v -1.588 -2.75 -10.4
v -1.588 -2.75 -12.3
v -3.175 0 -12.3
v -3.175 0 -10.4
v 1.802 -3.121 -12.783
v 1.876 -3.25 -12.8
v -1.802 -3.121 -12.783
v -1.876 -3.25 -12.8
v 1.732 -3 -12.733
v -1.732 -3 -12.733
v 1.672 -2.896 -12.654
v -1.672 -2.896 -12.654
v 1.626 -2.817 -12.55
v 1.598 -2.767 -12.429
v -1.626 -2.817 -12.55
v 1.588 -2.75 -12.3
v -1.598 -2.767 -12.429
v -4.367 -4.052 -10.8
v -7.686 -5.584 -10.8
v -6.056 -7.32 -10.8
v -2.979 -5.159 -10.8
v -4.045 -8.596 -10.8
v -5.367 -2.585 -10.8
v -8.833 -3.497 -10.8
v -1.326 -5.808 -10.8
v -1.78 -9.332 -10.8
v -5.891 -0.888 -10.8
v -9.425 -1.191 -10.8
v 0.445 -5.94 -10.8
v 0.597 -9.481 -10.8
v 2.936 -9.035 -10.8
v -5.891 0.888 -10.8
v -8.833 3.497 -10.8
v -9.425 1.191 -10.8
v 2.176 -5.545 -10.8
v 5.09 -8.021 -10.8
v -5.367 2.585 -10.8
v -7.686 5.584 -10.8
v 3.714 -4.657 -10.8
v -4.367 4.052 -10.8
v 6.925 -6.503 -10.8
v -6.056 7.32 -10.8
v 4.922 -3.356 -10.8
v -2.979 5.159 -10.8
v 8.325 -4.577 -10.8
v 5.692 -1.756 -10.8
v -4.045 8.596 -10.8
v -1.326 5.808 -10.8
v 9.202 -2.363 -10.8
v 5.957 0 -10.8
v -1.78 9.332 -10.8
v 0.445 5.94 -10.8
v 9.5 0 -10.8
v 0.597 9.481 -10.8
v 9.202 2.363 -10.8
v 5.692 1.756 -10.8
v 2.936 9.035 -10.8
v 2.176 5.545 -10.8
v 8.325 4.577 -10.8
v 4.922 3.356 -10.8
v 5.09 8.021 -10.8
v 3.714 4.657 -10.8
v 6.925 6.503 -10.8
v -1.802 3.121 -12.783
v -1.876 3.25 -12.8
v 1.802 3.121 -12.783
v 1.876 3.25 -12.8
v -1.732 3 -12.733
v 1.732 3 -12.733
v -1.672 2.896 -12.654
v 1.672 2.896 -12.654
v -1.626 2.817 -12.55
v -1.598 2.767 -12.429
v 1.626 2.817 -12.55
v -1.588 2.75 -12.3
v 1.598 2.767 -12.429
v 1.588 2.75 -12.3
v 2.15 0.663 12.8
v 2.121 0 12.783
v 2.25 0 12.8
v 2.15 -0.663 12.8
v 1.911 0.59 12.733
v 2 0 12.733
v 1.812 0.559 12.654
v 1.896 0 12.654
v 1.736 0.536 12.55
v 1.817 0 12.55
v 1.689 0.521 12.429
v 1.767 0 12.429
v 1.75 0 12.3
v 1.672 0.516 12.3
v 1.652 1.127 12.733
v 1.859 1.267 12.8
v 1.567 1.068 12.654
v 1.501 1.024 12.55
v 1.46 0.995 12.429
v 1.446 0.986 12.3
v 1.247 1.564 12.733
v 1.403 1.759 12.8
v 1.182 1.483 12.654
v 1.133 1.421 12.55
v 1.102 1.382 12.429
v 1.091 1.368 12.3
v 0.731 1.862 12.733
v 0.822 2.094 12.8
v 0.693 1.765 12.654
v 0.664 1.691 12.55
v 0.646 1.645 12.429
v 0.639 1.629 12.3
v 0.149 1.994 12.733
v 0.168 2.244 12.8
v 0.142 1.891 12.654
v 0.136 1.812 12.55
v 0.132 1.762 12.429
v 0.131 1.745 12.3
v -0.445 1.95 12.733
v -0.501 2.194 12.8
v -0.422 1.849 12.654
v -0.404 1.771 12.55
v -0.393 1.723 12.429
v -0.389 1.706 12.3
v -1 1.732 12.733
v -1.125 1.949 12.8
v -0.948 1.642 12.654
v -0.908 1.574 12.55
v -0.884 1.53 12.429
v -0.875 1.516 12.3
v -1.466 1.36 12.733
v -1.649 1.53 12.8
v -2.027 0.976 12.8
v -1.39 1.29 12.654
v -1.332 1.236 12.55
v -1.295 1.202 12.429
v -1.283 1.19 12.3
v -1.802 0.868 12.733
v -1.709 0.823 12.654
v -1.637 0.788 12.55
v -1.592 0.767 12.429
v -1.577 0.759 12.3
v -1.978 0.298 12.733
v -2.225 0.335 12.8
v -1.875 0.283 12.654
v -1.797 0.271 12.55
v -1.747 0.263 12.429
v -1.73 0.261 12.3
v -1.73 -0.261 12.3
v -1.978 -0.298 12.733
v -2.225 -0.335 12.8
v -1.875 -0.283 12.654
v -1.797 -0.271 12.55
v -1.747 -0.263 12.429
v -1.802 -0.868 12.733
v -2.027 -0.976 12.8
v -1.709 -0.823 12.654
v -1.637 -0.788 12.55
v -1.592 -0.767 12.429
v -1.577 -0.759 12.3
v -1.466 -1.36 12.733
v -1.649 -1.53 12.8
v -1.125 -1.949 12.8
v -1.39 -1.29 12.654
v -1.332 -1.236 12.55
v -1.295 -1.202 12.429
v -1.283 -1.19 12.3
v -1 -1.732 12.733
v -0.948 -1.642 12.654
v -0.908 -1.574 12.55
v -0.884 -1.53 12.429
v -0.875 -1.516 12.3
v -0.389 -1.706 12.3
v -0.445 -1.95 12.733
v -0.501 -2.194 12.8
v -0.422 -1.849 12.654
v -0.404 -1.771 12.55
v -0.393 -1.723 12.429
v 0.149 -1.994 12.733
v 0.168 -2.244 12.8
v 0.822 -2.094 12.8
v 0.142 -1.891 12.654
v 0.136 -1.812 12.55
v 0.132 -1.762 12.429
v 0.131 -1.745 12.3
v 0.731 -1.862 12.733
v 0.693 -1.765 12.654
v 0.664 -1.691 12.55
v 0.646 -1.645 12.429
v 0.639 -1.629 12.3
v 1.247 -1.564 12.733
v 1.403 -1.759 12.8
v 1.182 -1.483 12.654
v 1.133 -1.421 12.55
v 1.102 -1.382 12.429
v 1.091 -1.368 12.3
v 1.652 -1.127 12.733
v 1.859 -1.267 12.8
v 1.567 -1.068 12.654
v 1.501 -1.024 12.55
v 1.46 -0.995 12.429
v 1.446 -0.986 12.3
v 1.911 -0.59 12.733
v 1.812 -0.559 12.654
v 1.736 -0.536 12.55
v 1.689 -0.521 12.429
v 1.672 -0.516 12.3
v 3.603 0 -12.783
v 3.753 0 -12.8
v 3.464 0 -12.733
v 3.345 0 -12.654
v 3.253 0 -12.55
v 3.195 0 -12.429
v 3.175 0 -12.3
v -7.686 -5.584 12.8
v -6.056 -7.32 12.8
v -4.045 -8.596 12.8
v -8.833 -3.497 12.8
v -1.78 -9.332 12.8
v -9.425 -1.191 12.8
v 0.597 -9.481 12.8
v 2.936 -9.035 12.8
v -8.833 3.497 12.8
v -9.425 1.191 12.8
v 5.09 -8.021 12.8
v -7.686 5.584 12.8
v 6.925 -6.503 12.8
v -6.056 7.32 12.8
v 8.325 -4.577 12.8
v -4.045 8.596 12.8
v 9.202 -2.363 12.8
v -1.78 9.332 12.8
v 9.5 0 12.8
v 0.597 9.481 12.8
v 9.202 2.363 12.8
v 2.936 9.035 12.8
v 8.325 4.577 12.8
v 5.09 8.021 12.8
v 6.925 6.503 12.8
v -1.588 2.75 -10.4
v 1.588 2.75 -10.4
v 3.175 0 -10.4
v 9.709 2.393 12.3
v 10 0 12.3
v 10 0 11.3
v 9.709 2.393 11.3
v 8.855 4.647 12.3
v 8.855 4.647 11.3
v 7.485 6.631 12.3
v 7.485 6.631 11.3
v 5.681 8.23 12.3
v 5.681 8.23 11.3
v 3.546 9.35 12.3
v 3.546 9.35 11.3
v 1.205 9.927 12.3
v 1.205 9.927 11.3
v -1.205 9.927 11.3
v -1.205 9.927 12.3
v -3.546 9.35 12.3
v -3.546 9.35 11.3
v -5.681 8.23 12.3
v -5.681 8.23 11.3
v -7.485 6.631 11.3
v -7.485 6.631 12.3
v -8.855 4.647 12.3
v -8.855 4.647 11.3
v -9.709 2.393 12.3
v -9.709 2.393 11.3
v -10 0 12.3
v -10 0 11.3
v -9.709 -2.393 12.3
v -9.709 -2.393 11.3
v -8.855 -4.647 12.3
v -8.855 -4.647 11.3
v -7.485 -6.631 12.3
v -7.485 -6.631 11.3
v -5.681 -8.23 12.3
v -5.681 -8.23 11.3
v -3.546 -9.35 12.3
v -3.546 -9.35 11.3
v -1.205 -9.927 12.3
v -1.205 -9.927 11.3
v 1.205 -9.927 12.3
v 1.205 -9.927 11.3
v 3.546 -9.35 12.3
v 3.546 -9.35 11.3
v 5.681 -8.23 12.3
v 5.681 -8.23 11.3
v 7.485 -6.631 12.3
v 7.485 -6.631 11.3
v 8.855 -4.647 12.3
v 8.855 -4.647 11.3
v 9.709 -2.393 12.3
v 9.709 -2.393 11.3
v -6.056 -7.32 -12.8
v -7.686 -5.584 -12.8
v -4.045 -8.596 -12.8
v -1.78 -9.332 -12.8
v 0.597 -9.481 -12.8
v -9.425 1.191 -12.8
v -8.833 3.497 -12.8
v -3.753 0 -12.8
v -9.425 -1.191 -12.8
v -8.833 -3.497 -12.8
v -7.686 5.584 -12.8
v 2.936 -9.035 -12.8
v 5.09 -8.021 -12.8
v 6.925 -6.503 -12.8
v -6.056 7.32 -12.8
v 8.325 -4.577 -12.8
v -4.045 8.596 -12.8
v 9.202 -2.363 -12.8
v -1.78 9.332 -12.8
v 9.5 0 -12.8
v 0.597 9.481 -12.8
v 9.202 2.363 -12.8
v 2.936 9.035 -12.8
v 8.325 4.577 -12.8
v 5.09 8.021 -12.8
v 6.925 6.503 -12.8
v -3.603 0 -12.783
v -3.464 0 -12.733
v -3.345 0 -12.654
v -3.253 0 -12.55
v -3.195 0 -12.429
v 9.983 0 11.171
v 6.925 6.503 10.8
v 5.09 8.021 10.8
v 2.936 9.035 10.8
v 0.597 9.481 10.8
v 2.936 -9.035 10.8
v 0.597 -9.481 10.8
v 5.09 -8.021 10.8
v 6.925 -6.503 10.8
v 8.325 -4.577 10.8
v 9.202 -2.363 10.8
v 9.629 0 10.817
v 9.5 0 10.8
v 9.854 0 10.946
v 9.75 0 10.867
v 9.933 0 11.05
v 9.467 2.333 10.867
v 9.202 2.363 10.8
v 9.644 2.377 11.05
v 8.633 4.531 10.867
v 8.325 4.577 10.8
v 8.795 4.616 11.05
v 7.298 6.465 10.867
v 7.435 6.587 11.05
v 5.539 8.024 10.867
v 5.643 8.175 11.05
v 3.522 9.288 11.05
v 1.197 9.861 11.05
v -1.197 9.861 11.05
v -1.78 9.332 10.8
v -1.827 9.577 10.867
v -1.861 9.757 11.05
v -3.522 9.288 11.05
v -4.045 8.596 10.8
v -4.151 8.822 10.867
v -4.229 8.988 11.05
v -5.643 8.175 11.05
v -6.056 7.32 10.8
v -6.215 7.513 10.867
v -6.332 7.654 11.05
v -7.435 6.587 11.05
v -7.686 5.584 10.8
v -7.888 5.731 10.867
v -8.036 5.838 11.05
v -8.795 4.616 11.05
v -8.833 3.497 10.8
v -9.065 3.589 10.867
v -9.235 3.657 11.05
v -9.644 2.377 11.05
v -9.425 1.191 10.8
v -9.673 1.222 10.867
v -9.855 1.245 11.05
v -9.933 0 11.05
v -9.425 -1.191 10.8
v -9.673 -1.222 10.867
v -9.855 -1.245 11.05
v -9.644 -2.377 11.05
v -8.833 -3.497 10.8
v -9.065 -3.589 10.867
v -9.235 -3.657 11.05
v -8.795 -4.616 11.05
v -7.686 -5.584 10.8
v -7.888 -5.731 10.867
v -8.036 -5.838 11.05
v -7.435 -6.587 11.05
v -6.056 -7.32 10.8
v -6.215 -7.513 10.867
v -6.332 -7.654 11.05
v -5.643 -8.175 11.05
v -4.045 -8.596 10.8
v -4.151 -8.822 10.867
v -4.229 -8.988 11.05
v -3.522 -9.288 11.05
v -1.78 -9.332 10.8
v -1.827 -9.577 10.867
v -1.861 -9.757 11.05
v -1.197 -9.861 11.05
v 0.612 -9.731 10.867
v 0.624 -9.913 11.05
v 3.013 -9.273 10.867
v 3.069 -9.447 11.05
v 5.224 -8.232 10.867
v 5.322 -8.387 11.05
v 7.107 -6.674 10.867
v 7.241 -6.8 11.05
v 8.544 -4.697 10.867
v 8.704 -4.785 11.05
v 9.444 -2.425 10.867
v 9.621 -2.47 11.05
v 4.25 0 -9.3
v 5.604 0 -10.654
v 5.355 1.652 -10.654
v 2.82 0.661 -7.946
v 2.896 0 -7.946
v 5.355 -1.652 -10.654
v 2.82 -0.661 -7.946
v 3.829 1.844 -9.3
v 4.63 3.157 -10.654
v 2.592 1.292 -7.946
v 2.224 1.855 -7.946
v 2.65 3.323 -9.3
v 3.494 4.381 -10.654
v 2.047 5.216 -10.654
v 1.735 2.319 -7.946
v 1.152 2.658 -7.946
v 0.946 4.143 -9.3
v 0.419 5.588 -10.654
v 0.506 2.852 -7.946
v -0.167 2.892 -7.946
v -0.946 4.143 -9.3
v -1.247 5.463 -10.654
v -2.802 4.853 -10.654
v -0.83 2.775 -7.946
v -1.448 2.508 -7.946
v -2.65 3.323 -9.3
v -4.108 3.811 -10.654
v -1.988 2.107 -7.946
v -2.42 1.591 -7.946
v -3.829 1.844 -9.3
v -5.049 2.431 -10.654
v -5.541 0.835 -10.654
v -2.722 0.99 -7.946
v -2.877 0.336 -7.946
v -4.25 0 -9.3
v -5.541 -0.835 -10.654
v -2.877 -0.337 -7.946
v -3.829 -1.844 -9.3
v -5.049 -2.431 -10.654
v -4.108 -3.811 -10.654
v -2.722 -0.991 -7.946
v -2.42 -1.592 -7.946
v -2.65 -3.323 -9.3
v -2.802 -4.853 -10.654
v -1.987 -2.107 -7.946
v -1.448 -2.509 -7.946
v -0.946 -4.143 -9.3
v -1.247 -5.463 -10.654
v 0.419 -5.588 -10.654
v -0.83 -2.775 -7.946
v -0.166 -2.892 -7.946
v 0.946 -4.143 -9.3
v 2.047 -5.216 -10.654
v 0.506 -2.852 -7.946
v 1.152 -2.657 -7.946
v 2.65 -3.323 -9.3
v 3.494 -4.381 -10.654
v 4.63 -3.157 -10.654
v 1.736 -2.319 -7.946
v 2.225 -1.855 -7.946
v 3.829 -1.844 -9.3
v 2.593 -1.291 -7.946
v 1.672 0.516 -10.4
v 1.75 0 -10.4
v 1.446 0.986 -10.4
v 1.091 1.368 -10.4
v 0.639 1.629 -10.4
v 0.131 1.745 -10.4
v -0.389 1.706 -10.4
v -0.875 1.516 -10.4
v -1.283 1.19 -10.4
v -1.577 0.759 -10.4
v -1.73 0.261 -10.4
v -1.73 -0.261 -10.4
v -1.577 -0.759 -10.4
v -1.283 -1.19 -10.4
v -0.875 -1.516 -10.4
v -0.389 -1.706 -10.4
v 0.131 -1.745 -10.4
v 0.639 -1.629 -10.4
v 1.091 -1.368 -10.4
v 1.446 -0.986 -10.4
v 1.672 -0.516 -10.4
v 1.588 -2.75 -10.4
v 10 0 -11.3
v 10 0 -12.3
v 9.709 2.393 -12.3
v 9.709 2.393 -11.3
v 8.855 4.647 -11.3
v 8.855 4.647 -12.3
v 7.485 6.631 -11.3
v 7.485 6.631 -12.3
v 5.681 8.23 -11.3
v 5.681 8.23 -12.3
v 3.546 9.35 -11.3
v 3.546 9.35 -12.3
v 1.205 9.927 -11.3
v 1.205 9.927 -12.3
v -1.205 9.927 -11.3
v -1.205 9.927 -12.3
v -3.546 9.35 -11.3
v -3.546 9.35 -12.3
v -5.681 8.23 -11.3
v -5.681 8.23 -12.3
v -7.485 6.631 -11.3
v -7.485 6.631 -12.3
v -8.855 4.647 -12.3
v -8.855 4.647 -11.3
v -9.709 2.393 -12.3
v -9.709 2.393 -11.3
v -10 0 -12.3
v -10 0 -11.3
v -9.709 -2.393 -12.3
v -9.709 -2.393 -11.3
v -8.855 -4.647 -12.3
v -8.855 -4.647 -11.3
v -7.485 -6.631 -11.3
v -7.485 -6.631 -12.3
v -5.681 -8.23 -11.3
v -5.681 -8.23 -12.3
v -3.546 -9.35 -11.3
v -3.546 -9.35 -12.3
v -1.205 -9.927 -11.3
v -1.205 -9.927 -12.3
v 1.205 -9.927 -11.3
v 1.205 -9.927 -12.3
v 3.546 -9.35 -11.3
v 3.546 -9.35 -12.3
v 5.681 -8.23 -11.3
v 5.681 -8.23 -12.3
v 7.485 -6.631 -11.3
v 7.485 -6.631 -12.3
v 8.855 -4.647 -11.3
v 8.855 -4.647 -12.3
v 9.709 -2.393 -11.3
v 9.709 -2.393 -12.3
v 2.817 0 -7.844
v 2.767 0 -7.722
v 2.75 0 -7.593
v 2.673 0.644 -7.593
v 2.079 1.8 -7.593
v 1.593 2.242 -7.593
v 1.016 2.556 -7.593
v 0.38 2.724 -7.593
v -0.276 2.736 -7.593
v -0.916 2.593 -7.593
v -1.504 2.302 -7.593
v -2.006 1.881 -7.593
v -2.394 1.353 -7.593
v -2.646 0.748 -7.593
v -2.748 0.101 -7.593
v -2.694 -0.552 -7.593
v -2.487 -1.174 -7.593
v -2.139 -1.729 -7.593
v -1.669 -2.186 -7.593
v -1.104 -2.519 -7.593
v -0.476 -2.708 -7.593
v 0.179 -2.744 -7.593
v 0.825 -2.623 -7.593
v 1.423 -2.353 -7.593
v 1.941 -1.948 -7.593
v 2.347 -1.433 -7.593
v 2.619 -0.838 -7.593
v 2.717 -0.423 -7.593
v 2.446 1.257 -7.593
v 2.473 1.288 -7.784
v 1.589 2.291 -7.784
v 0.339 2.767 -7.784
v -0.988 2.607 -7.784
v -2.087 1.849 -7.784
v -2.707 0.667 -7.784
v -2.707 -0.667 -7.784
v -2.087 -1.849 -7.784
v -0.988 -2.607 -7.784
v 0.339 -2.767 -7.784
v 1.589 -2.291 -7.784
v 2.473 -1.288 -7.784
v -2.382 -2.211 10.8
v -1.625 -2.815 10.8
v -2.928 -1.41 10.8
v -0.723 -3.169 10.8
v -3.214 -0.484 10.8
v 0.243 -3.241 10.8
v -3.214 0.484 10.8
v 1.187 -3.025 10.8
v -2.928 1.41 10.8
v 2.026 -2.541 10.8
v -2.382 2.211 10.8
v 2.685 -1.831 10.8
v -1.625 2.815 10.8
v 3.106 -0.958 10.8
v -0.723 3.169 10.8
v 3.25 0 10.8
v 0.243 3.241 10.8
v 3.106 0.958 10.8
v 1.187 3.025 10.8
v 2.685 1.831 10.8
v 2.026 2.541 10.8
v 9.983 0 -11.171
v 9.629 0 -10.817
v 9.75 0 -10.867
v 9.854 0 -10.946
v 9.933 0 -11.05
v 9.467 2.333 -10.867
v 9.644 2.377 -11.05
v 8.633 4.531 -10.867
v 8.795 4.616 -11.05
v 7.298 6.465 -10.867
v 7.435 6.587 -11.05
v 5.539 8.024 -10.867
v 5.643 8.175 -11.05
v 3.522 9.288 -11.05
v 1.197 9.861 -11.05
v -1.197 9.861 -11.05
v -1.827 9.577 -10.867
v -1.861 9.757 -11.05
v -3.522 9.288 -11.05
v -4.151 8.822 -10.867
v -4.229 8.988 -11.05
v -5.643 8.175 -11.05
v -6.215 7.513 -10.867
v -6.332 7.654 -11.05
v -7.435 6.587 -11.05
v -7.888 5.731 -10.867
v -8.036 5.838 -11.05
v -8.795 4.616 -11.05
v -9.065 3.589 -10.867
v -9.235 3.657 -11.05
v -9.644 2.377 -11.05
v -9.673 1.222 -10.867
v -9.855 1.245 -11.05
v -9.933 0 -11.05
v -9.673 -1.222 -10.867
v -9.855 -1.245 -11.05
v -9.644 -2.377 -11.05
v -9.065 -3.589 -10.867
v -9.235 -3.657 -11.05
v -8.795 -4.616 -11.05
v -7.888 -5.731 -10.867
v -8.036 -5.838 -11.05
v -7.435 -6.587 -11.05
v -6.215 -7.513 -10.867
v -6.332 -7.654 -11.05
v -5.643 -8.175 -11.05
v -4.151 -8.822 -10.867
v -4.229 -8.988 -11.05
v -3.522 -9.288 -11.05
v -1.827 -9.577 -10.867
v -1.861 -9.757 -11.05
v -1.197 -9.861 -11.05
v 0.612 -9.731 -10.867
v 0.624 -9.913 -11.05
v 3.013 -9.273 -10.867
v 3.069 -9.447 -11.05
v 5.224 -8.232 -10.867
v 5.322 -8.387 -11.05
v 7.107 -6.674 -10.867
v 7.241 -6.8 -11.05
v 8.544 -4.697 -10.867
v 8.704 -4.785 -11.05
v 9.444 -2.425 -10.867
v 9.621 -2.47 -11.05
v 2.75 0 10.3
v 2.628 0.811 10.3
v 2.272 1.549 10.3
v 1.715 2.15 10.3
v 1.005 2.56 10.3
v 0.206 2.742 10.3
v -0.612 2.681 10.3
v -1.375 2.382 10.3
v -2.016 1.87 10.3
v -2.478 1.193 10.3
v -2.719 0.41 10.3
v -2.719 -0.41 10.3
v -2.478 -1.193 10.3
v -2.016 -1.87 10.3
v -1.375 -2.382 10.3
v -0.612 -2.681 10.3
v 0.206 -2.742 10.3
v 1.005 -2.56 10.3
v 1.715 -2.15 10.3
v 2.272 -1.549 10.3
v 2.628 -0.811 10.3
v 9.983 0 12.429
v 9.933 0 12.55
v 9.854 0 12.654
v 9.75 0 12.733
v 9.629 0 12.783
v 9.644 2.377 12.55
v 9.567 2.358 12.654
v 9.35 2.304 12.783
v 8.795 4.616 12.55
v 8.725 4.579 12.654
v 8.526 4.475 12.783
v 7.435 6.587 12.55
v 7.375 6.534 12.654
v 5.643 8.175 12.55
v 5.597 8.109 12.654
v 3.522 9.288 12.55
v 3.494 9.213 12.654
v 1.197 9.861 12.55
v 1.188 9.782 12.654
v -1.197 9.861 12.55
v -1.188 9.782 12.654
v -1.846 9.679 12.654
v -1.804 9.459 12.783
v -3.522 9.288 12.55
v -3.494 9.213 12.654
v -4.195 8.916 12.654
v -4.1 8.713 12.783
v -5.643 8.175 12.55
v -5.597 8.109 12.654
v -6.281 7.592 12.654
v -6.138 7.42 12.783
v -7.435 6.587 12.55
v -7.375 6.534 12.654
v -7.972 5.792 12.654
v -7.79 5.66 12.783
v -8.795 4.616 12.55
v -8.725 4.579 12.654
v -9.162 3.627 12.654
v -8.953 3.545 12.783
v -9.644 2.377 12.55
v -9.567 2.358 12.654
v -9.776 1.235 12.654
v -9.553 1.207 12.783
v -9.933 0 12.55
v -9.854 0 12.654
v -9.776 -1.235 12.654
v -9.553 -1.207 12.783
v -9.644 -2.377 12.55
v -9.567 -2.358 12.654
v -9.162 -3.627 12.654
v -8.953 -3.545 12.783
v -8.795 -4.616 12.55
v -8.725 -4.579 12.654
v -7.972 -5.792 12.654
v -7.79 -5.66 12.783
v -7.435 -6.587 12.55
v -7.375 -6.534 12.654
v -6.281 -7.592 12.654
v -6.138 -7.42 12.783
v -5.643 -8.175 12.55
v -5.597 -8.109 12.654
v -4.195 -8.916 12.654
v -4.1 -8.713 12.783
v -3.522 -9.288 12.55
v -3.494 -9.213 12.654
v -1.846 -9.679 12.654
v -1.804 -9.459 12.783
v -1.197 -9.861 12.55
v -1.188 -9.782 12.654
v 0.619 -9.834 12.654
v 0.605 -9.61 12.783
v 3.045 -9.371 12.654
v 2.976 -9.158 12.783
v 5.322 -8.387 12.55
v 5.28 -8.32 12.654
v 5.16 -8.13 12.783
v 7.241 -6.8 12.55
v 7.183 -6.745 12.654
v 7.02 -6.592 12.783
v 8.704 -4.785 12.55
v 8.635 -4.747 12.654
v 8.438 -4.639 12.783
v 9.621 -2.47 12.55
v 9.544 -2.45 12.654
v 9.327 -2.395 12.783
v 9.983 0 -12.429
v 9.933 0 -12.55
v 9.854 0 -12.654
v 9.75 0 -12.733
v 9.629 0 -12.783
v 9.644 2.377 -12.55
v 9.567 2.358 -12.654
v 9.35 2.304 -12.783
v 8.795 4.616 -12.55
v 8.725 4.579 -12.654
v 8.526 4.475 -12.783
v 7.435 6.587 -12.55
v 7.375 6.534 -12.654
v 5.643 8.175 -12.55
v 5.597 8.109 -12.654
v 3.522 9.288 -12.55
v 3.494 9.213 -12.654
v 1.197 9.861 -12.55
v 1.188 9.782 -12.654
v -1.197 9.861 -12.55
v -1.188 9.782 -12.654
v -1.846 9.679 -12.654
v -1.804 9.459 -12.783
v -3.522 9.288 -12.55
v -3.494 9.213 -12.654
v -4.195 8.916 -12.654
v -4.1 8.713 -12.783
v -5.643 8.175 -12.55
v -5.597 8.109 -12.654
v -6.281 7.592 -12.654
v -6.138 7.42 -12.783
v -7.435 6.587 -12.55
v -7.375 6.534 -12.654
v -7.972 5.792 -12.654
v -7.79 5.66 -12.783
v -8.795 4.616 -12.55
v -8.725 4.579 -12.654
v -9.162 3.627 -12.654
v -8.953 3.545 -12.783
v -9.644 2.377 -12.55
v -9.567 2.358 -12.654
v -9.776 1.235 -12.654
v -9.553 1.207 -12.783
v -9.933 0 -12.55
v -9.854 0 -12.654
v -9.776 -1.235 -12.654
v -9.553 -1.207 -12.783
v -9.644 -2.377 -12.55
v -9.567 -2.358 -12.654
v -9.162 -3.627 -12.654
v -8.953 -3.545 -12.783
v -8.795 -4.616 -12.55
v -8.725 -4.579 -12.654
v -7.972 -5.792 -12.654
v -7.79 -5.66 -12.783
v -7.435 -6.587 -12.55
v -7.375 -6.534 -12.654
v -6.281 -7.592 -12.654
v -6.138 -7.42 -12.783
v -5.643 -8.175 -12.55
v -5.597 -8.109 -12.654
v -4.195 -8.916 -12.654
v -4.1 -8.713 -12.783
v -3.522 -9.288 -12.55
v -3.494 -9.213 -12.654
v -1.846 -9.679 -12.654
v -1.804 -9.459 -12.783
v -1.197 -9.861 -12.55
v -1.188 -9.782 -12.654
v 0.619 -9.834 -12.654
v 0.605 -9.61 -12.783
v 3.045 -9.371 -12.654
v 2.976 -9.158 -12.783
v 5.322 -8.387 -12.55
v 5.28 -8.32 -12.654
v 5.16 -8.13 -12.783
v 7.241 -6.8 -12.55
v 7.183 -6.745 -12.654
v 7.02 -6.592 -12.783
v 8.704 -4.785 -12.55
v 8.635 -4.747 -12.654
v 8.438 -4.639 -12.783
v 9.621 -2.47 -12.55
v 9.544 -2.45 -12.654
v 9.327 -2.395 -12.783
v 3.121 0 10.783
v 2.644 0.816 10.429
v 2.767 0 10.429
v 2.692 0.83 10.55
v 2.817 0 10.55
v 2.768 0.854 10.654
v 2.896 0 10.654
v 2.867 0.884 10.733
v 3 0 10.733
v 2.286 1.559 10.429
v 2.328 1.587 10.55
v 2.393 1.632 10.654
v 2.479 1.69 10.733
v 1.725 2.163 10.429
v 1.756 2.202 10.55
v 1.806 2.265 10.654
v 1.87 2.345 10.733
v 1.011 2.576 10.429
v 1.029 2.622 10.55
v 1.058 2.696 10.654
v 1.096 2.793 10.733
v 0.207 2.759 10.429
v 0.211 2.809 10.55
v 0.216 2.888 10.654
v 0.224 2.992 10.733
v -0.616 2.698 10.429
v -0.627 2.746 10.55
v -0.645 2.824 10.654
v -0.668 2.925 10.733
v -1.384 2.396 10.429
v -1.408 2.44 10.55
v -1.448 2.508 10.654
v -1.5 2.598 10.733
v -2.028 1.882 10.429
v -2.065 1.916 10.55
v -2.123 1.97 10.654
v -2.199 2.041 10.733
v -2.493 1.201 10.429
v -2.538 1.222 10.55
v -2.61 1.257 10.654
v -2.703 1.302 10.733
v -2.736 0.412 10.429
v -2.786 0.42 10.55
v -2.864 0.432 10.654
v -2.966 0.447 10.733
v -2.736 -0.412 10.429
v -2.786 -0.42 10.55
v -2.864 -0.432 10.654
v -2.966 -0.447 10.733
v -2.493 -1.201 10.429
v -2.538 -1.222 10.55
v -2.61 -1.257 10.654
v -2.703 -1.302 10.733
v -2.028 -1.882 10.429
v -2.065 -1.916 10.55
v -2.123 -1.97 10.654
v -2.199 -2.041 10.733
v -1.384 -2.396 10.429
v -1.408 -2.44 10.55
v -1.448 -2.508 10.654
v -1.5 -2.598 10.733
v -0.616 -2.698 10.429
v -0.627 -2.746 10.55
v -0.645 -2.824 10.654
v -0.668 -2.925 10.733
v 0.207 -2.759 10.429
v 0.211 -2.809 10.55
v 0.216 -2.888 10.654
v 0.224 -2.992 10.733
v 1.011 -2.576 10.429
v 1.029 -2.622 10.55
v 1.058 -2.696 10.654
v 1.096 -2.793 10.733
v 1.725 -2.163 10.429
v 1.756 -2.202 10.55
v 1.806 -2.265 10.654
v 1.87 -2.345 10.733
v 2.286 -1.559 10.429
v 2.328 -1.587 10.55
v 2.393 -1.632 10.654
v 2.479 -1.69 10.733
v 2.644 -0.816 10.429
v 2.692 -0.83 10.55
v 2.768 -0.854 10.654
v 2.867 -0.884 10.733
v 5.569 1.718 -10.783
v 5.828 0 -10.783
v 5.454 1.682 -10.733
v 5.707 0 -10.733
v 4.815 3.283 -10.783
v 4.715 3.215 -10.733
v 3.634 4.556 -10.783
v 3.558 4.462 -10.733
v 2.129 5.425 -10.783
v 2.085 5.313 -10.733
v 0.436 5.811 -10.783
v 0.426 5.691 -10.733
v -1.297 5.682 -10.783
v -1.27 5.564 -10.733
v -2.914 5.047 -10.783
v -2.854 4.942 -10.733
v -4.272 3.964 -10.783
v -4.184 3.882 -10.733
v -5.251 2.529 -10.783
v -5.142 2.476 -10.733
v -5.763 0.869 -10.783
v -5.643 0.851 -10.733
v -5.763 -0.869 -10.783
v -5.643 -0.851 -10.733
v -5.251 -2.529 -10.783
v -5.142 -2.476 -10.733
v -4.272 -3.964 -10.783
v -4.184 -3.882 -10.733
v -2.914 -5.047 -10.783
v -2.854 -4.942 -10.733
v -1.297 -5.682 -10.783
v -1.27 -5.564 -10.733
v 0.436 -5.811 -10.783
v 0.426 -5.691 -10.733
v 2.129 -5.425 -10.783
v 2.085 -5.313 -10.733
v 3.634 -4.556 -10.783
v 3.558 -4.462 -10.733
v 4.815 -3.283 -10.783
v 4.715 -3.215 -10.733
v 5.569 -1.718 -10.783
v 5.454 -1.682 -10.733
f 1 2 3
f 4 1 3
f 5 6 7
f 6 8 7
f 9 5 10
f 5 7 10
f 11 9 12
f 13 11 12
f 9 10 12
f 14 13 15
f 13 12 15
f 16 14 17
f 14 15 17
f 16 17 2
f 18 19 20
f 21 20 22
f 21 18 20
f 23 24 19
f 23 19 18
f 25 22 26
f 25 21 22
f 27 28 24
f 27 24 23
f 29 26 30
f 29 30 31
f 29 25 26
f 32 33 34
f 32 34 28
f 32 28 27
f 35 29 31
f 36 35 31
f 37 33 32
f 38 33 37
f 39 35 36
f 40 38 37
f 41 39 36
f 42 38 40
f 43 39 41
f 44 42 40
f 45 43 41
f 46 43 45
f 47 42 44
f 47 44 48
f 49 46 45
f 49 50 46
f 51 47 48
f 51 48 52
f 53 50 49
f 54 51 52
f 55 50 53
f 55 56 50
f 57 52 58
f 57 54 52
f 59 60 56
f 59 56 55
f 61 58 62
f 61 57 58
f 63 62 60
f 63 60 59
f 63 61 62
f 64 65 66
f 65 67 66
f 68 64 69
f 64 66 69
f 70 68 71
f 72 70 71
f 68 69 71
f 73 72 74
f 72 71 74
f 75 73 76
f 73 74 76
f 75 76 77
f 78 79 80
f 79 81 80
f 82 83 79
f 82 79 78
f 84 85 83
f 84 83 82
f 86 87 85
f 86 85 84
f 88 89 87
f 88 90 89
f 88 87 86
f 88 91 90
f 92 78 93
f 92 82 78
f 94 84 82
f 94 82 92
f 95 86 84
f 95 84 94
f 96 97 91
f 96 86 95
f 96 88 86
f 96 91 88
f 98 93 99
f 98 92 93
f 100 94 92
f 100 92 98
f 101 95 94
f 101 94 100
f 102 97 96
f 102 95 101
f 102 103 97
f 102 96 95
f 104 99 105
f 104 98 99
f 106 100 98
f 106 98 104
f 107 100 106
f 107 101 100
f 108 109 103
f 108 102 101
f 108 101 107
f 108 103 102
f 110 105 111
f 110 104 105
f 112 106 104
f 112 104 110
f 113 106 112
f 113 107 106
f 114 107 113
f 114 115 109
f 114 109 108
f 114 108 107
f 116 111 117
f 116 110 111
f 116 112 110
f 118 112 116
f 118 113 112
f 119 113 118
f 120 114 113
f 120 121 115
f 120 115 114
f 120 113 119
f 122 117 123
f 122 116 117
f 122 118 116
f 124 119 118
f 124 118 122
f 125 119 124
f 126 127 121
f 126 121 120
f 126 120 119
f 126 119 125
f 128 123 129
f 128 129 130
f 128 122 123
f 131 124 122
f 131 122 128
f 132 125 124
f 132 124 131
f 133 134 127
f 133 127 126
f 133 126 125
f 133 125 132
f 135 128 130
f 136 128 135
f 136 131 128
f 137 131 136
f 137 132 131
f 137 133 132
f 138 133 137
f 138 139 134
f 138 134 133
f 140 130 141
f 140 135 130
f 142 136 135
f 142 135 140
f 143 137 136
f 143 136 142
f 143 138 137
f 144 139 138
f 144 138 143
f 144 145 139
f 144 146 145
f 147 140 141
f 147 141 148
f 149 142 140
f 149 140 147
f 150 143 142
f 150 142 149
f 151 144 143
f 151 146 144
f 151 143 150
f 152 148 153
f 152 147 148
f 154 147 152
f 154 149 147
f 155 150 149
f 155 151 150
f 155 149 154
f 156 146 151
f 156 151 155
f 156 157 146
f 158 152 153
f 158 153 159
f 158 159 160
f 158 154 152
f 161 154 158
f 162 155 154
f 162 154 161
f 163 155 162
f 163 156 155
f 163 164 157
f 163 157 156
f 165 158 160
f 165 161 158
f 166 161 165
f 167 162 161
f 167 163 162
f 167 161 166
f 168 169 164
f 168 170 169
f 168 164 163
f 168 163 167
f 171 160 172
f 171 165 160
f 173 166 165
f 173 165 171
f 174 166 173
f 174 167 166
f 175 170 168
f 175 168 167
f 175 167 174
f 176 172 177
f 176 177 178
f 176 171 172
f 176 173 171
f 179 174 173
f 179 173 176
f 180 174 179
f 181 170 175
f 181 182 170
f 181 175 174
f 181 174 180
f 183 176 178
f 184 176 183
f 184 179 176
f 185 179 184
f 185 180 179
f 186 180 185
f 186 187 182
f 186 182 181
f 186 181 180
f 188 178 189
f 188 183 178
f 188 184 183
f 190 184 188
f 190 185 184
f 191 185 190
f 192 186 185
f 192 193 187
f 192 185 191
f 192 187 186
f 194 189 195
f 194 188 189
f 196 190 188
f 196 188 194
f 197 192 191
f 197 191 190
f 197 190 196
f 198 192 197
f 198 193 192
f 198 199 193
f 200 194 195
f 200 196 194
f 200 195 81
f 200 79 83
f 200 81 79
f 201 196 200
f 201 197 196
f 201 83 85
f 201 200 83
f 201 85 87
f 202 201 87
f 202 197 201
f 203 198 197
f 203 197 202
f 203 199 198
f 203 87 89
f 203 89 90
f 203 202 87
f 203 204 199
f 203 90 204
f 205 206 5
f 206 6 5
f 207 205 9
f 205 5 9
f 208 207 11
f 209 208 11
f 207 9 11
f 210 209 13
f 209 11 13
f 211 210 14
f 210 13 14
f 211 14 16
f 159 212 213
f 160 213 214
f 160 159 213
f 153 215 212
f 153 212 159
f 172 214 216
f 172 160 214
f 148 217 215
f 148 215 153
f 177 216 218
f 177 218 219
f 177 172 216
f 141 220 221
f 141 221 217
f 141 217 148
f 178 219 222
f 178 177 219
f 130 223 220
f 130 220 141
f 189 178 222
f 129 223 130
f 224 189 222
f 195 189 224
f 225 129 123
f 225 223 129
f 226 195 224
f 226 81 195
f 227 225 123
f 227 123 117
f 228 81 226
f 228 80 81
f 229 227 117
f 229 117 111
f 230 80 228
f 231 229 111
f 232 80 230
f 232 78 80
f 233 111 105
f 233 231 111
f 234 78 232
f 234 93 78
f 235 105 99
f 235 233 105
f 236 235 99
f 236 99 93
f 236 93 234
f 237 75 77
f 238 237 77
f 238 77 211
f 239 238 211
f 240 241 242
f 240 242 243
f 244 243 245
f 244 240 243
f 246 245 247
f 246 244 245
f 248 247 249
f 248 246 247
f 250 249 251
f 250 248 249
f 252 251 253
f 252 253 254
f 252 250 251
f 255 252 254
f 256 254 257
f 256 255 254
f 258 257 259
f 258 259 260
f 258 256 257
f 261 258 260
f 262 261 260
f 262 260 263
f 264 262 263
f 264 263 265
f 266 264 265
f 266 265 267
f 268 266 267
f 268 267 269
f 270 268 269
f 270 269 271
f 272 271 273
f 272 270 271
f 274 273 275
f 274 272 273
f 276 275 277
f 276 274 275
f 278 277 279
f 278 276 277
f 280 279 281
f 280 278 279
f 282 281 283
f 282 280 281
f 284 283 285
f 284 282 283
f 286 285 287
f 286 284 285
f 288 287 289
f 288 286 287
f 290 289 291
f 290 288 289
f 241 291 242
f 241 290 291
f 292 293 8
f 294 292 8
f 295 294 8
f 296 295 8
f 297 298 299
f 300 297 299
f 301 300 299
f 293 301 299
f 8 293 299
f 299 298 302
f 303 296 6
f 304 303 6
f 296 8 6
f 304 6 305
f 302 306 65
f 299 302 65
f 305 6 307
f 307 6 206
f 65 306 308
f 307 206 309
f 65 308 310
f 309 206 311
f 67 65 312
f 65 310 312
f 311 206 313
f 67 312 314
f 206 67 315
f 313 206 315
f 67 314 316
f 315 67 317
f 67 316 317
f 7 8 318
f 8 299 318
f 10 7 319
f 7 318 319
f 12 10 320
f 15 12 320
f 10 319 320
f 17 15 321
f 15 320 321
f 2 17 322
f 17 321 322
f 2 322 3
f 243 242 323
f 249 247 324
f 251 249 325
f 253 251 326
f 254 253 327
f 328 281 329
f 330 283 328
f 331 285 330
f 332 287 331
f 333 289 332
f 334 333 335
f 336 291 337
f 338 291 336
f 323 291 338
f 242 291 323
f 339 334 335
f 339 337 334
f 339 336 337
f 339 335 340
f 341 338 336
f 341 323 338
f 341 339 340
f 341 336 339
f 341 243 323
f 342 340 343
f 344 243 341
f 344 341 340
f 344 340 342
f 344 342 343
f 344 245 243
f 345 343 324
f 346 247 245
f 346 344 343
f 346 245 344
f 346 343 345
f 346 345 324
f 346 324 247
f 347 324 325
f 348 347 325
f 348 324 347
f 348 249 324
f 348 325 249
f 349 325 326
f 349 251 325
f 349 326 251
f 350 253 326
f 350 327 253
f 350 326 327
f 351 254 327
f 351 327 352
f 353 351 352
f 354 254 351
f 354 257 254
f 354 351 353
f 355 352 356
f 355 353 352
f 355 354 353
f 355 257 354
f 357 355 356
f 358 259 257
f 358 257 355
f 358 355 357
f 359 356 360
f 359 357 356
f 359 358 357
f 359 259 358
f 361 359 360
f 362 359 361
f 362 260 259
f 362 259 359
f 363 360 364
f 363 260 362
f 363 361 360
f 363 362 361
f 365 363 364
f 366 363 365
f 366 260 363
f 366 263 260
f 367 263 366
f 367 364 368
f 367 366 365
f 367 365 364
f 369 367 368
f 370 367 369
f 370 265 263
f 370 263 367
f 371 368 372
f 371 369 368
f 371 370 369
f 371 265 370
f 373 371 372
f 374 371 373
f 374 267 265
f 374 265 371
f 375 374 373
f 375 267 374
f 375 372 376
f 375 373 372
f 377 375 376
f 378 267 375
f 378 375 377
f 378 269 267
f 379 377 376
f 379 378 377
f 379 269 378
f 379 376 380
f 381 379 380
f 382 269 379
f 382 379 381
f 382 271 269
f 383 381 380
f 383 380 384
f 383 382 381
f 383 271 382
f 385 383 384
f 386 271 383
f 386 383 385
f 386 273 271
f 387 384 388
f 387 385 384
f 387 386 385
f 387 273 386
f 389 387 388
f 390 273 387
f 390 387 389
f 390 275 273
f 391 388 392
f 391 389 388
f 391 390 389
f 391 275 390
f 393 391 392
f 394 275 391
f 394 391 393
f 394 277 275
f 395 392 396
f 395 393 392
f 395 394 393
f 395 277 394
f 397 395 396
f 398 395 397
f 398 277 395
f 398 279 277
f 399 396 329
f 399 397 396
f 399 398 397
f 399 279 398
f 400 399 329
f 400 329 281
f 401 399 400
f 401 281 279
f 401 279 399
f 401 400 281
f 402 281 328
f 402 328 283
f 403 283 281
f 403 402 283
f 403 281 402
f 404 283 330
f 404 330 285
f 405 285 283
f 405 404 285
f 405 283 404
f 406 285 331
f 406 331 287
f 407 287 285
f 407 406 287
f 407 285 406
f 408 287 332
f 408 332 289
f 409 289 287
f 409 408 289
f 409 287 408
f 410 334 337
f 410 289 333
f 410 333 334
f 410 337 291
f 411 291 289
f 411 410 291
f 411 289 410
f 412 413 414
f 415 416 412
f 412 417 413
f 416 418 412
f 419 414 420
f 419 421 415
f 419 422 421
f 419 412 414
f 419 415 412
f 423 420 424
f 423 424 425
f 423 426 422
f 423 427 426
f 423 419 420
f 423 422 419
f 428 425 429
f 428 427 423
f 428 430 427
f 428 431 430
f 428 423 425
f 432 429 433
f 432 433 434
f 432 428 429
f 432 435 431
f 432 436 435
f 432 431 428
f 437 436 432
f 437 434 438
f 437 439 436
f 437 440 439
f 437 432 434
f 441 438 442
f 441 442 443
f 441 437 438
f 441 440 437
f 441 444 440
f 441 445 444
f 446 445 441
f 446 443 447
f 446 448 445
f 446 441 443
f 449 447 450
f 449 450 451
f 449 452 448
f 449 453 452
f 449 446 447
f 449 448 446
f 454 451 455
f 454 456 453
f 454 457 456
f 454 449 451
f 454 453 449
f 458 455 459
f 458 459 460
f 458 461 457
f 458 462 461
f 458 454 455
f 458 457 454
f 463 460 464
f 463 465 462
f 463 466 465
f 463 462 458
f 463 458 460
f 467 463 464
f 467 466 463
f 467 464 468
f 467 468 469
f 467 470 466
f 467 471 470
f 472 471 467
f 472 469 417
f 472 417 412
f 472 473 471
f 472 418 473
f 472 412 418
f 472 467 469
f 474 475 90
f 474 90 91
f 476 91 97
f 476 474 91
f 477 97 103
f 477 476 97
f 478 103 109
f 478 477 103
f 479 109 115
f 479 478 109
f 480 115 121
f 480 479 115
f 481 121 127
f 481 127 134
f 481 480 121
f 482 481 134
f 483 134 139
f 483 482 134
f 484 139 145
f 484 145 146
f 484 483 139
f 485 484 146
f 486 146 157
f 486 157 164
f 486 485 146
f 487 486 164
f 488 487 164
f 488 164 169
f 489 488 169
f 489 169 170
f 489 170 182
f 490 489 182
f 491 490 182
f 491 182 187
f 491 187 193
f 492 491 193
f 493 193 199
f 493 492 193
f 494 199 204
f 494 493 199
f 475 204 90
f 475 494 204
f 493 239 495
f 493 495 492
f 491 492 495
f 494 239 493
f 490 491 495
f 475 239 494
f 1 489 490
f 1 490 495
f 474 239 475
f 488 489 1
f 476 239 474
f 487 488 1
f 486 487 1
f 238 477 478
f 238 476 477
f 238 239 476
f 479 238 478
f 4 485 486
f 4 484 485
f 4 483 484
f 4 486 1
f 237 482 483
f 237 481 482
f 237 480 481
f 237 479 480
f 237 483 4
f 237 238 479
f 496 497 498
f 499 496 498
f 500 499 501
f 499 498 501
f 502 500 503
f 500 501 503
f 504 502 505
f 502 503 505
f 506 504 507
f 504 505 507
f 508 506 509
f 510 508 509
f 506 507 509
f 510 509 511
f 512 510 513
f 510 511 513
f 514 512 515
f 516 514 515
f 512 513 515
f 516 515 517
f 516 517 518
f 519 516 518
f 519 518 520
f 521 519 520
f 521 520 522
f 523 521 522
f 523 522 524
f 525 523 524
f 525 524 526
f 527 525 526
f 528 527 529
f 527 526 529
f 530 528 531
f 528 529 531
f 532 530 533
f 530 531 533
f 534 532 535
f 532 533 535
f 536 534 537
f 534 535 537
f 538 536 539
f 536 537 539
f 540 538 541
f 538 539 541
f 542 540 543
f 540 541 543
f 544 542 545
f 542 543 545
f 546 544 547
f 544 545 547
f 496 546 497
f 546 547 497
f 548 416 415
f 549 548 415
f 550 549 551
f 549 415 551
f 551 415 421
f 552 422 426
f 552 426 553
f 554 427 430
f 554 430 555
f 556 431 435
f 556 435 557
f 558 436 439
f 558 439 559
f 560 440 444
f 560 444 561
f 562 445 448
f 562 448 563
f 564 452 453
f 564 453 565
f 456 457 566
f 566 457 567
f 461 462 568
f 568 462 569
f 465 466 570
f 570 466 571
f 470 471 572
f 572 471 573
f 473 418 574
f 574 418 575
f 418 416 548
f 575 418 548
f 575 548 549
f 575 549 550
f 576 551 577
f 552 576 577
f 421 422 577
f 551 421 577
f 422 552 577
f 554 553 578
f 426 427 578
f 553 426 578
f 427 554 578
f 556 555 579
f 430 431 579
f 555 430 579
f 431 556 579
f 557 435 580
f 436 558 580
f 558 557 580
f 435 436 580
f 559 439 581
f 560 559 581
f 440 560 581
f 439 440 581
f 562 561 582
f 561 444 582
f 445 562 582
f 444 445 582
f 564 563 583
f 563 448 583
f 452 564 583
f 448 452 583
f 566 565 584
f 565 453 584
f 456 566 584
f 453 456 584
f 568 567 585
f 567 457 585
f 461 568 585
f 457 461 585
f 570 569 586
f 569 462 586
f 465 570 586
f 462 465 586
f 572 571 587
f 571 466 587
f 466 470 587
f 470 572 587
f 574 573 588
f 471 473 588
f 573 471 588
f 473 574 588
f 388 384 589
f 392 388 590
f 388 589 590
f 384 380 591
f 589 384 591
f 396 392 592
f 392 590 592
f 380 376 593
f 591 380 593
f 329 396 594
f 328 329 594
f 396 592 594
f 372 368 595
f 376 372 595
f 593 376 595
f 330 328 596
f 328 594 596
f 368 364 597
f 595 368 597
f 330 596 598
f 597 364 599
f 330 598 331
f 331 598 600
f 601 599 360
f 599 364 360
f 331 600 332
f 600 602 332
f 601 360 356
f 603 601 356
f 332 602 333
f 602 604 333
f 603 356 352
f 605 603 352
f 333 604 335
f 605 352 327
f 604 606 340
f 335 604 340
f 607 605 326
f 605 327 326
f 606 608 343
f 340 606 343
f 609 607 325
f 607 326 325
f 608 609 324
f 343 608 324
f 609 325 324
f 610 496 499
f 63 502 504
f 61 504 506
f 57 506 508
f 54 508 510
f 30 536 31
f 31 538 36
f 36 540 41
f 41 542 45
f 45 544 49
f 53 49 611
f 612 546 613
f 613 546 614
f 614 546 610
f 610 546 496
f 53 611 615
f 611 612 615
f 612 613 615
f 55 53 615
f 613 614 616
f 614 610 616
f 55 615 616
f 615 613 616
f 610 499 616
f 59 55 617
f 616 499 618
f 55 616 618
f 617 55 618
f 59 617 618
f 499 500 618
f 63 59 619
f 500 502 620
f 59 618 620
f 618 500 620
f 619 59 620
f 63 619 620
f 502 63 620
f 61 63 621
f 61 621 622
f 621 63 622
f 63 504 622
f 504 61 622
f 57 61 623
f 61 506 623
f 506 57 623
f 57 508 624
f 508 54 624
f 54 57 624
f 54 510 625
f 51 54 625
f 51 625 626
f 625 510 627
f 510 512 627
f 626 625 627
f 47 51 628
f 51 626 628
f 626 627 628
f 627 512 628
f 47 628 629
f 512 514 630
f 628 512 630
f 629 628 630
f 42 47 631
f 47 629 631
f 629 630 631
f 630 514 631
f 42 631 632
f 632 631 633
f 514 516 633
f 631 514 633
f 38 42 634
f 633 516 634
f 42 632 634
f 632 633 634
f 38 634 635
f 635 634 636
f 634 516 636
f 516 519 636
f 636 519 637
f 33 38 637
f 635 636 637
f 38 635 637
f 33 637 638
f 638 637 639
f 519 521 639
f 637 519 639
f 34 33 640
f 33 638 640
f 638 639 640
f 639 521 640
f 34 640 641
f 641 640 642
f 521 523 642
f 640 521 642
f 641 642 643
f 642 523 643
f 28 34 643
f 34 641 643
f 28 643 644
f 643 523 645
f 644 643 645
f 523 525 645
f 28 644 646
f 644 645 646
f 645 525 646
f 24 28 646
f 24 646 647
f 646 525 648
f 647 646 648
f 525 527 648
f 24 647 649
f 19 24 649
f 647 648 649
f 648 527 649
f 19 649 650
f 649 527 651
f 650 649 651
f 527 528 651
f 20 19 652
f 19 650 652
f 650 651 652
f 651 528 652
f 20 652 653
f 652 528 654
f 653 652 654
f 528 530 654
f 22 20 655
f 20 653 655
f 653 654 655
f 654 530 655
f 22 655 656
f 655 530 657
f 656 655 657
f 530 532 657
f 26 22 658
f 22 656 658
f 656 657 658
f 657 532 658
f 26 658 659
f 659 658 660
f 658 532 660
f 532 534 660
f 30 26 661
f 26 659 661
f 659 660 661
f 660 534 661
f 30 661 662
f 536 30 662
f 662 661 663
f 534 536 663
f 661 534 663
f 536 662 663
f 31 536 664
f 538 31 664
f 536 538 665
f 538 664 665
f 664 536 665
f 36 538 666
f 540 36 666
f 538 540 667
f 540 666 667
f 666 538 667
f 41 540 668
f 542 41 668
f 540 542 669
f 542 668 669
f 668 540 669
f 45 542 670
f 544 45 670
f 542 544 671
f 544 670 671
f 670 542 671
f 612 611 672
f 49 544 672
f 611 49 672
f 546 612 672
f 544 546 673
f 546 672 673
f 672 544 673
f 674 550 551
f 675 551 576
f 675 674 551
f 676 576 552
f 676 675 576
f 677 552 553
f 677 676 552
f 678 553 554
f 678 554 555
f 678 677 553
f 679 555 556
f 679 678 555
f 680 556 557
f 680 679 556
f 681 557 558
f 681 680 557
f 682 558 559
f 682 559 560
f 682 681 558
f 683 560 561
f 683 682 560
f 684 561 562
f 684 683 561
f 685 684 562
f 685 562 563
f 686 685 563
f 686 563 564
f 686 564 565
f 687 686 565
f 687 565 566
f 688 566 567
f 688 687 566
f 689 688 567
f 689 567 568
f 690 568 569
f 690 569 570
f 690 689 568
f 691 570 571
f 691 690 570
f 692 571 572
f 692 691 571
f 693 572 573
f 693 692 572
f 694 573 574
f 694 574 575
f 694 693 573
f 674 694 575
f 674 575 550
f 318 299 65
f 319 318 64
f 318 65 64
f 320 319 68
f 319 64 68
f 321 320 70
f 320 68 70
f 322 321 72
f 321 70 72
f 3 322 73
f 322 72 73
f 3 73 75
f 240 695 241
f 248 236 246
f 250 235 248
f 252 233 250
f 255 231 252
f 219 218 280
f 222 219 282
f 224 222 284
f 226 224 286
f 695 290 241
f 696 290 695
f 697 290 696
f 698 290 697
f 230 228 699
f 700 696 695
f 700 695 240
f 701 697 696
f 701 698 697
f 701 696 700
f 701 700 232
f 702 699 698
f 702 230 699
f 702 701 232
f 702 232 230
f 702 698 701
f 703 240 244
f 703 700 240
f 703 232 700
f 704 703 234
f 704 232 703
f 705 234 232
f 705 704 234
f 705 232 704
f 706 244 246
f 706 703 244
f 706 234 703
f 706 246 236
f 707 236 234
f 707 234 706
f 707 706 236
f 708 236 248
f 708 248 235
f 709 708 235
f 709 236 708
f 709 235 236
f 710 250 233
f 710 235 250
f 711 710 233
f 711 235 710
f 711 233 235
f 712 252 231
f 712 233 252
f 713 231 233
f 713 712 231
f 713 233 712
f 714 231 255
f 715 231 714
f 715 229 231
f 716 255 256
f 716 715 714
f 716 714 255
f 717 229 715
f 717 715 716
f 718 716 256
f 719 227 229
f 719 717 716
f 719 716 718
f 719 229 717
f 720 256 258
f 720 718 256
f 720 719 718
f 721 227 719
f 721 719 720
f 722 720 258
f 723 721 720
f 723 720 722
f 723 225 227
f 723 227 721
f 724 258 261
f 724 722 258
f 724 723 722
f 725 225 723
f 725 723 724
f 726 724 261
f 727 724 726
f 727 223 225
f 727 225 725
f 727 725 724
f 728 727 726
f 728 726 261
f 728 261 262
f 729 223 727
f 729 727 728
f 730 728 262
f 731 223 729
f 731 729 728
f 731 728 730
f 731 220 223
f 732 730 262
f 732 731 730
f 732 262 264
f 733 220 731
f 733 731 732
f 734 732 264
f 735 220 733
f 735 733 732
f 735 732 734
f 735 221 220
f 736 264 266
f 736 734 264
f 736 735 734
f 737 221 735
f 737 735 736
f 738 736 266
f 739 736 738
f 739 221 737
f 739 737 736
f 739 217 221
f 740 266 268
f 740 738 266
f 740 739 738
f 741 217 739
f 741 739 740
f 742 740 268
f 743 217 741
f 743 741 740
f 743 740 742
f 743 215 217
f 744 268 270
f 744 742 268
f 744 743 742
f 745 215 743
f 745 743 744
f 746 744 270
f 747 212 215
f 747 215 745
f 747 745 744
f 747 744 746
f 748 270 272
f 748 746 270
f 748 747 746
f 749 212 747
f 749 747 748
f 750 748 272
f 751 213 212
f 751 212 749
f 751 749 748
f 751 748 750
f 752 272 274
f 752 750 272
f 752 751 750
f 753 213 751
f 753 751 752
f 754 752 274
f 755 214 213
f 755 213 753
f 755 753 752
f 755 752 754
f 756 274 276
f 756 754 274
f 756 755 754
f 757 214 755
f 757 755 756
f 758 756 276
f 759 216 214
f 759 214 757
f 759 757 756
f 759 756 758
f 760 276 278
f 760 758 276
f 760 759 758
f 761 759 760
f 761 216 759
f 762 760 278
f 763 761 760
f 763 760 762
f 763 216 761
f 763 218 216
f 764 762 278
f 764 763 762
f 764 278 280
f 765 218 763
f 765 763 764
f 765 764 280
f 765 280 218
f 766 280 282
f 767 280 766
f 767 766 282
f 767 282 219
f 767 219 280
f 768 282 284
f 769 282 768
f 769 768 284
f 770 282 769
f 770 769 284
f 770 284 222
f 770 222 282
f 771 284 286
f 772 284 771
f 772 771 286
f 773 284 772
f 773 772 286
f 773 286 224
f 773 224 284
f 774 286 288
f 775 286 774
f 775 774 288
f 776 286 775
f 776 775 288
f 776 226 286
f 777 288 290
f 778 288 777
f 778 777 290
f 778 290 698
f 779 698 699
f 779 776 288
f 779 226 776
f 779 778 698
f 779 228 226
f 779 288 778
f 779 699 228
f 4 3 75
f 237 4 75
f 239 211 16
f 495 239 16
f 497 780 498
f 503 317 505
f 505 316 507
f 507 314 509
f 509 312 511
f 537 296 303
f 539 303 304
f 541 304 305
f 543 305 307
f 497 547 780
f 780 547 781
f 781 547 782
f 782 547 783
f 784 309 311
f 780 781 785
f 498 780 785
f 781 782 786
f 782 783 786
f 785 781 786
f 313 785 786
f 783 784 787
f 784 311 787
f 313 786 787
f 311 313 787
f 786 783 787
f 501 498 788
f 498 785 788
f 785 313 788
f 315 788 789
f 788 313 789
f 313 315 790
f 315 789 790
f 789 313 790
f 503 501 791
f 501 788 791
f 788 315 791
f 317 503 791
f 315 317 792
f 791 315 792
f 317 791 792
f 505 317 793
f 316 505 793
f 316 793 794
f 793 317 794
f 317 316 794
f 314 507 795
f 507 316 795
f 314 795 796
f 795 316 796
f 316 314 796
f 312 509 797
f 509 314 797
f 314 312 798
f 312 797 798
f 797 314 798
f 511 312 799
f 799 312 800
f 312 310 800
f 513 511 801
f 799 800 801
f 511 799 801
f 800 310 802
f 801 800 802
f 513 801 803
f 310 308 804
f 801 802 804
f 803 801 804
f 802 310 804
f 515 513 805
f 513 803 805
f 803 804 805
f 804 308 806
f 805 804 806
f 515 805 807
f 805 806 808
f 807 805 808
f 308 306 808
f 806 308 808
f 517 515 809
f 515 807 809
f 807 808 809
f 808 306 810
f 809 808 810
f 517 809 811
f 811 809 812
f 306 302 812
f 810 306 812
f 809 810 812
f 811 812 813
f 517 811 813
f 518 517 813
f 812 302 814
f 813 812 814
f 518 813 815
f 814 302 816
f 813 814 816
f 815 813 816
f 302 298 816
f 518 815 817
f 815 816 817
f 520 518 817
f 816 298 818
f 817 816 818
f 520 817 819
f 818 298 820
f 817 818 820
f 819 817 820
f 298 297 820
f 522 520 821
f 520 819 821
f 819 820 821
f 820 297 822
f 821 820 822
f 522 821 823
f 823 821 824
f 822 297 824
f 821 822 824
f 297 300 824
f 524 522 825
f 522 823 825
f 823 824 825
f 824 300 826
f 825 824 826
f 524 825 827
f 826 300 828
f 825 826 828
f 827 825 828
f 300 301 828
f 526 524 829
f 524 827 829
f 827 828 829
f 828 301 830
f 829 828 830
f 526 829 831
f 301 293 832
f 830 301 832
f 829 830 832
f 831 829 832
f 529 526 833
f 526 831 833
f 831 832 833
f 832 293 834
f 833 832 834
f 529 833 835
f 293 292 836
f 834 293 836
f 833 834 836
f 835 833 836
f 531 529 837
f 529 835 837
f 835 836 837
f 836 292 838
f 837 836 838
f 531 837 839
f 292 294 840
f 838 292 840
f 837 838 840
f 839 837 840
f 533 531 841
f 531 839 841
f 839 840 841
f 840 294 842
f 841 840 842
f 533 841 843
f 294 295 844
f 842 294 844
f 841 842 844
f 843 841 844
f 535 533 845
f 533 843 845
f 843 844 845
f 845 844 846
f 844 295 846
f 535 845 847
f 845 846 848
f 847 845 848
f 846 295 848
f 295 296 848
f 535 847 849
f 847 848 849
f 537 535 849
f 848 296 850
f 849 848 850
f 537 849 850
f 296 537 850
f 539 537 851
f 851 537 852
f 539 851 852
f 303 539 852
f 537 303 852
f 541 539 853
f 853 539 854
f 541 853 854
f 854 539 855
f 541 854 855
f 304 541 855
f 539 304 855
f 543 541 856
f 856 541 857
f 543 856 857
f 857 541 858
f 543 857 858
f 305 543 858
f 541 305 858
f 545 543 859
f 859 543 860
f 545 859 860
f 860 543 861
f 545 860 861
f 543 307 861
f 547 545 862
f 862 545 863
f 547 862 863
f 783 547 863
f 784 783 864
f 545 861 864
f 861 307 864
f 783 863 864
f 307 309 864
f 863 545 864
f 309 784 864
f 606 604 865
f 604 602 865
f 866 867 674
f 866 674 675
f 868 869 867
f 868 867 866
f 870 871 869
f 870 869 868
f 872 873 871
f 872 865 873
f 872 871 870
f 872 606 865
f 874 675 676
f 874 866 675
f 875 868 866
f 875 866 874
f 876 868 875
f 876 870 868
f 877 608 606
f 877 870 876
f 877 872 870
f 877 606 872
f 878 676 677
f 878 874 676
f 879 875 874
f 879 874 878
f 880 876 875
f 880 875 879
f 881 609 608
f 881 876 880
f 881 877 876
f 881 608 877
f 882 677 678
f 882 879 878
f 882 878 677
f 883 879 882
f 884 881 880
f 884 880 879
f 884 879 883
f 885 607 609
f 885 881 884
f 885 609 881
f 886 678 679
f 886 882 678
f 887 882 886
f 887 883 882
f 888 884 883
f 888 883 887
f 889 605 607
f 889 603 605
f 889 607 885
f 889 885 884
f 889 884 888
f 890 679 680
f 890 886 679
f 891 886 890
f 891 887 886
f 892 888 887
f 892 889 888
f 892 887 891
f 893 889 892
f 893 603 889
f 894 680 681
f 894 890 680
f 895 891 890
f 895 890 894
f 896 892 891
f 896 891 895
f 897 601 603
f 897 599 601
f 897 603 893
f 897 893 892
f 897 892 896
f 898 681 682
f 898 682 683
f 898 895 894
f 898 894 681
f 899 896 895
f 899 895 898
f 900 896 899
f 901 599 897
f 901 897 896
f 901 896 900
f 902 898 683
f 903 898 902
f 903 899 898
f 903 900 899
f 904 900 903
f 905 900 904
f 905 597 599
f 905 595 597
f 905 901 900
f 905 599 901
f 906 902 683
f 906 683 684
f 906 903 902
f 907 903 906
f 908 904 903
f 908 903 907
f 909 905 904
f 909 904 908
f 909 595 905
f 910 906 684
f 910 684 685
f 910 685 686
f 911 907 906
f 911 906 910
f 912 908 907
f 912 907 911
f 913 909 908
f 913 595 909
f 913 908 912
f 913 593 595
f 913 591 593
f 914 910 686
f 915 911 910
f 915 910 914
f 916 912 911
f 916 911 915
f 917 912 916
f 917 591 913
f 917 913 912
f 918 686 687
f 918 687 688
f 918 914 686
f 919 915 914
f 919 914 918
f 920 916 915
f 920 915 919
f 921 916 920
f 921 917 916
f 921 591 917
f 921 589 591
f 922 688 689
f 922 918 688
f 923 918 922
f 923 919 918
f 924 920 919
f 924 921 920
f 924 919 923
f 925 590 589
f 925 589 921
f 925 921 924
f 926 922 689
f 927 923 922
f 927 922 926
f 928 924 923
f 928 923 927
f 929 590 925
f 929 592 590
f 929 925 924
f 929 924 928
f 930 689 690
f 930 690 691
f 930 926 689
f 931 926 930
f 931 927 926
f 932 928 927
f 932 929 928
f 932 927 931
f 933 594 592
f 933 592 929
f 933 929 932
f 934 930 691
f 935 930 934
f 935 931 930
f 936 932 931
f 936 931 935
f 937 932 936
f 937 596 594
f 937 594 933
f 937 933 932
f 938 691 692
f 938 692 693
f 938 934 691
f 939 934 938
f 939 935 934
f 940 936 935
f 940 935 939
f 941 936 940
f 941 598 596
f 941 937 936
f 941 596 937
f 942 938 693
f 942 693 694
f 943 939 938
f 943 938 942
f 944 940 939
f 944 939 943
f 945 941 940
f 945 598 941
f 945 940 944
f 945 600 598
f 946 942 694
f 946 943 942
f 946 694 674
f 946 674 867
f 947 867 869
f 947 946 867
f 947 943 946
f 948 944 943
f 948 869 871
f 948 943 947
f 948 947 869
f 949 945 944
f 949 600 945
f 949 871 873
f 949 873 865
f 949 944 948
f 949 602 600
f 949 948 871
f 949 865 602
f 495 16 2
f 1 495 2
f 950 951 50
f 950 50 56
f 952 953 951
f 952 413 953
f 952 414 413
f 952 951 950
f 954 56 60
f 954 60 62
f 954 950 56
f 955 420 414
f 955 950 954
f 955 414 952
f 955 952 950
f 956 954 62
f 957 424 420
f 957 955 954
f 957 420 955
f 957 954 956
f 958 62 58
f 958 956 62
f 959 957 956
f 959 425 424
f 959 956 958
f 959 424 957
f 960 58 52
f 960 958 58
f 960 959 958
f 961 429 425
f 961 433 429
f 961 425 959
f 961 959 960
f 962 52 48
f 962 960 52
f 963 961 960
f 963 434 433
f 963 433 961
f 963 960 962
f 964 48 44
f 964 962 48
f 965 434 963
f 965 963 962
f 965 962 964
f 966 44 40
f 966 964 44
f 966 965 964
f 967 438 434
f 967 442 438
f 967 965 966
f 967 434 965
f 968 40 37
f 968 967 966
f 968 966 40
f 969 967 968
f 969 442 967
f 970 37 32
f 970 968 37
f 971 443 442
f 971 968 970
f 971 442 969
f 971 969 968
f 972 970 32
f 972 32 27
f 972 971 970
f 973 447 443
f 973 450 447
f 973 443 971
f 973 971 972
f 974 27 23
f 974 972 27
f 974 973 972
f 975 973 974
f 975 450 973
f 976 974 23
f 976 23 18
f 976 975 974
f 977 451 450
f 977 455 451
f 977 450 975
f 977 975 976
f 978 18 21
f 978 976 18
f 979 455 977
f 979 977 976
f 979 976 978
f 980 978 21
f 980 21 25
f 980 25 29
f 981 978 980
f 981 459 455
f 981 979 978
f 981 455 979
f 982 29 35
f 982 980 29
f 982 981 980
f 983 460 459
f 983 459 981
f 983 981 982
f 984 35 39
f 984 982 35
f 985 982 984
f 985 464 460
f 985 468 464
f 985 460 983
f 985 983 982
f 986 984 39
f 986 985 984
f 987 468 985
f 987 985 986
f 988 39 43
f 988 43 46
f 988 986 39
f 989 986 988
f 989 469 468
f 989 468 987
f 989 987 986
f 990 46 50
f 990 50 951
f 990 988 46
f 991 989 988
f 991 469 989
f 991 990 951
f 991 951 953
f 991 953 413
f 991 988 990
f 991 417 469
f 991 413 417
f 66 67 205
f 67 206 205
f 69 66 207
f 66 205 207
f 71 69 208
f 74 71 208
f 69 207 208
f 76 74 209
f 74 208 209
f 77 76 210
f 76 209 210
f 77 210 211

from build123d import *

# Parameters (mm, degrees)
SKETCH1_R           = 2.75
SKETCH1_R_2         = 1.75
BOSS_EXTRUDE1_DEPTH = 12.8
SKETCH2_R           = 10
SKETCH2_R_2         = 2.75
BOSS_EXTRUDE2_DEPTH = 2
CHAMFER3_SIZE       = 3
CUT_EXTRUDE1_DEPTH  = 2.4
FILLET2_R           = 0.5


with BuildPart() as part:
    # Sketch1 → Boss-Extrude1 (new body, symmetric)
    with BuildSketch(Plane.XY):
        Circle(SKETCH1_R)
        Circle(SKETCH1_R_2, mode=Mode.SUBTRACT)
    extrude(amount=BOSS_EXTRUDE1_DEPTH, both=True)

    # Sketch2 → Boss-Extrude2 (add)
    with BuildSketch(Plane.XY.offset(12.8)):
        Circle(SKETCH2_R)
        Circle(SKETCH2_R_2, mode=Mode.SUBTRACT)
    boss_extrude2 = extrude(amount=-BOSS_EXTRUDE2_DEPTH)

    # Mirror1: Boss-Extrude2 across plane
    add(boss_extrude2.mirror(Plane.XY))

    # Chamfer3
    chamfer3_edges = [part.edges().sort_by_distance(p)[0] for p in [
        (-2.75, 0, -10.8),
    ]]
    chamfer(chamfer3_edges, length=CHAMFER3_SIZE)

    # Sketch4 → Cut-Extrude1 (cut)
    with BuildSketch(Plane(origin=(0, 0, -12.8), x_dir=(-1, 0, 0), z_dir=(0, 0, -1))):
        Polygon((1.58771324, 2.75), (-1.58771324, 2.75), (-3.175426481, 0), (-1.58771324, -2.75), (1.58771324, -2.75), (3.175426481, 0), align=None)
    extrude(amount=-CUT_EXTRUDE1_DEPTH, mode=Mode.SUBTRACT)

    # Fillet2
    fillet2_edges = [part.edges().sort_by_distance(p)[0] for p in [
        (-10, 0, 10.8),
        (-10, 0, 12.8),
        (-10, 0, -10.8),
        (-10, 0, -12.8),
        (-5.75, 0, -10.8),
        (-2.75, 0, -7.8),
        (-2.38156986, 1.375, -12.8),
        (0, 2.75, -12.8),
        (2.38156986, 1.375, -12.8),
        (2.38156986, -1.375, -12.8),
        (0, -2.75, -12.8),
        (-2.38156986, -1.375, -12.8),
        (-1.75, 0, 12.8),
        (-2.75, 0, 10.8),
    ]]
    fillet(fillet2_edges, radius=FILLET2_R)


solid = part.part
